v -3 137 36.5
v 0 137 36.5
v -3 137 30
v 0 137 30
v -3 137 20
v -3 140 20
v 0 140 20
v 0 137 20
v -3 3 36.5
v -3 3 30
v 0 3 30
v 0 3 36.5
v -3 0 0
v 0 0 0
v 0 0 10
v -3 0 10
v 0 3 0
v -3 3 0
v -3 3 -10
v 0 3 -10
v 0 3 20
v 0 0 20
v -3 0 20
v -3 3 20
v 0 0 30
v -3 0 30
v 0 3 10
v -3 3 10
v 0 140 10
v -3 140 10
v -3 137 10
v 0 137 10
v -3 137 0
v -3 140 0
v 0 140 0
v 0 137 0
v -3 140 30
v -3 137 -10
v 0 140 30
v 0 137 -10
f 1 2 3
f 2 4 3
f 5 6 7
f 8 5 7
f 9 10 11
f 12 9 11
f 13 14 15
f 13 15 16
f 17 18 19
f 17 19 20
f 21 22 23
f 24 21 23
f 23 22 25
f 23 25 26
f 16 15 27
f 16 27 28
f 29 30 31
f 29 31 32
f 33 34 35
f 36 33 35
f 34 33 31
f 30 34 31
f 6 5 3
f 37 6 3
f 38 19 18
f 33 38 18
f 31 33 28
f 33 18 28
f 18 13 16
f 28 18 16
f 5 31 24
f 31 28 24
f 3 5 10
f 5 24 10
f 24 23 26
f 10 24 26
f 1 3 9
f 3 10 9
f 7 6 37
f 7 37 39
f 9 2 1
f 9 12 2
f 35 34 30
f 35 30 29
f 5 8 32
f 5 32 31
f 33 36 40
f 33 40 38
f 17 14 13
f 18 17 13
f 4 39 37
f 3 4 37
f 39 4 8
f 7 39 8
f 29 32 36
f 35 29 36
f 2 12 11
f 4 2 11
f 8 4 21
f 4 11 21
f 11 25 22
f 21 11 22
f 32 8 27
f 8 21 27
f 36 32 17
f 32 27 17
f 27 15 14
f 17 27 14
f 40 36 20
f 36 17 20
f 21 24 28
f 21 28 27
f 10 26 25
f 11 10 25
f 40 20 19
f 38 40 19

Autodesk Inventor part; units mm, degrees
ref_plane "YZ Plane" through (0, 0, 0) normal (1, 0, 0) x (0, 1, 0)
ref_plane "XZ Plane" through (0, 0, 0) normal (0, 1, 0) x (-1, 0, 0)
ref_plane "XY Plane" through (0, 0, 0) normal (0, 0, 1) x (1, 0, 0)
sketch "Sketch1" plane through (0, 0, 0) normal (0, 1, 0) x (-1, 0, 0)
  line L0 (0, 0) -> (0, -10)
  line L1 (0, -10) -> (3, -10)
  line L2 (0, 0) -> (0, 10)
  line L3 (0, 10) -> (0, 20)
  line L4 (0, 20) -> (0, 30)
  line L5 (0, 30) -> (0, 36.5)
  line L6 (0, 36.5) -> (3, 36.5)
  line L7 (3, 36.5) -> (3, -10)
  line L8 (3, 30) -> (0, 30)
  line L9 (0, 20) -> (3, 20)
  line L10 (0, 10) -> (3, 10)
  line L11 (0, 0) -> (3, 0)
  dimension "d0" = 10
  dimension "d1" = 3
  dimension "d2" = 10
  dimension "d3" = 10
  dimension "d4" = 10
  dimension "d5" = 6.5
  dimension "d6" = 3
extrude "Extrusion1" add sketch "Sketch1" along normal blind 3 contours L2 L10 L7 L11 | L4 L8 L7 L9
sketch "Sketch2" plane through (0, 3, 0) normal (0, 1, 0) x (1, 0, 0)
  line L0 (0, 0) -> (0, 10)
  line L1 (-3, -20) -> (-3, -30) projected
  line L2 (0, 10) -> (-3, 10)
  line L3 (-3, 10) -> (-3, -30)
  line L4 (-3, -30) -> (0, -30)
  line L5 (0, -30) -> (0, 10)
  line L6 (0, -30) -> (0, -36.5)
  line L7 (0, -36.5) -> (-3, -36.5)
  line L8 (-3, -36.5) -> (-3, -30)
  line L9 (-3, -30) -> (0, -30)
  line L10 (0, -30) -> (0, -36.5)
  dimension "d9" = 10
  dimension "d10" = 6.5
extrude "Extrusion2" add sketch "Sketch2" along normal blind 67
mirror "Mirror1" about plane through (-1.5, 70, 13.25) normal (0, 1, 0) of "Extrusion2", "Extrusion1"
properties part number "motorkap"
